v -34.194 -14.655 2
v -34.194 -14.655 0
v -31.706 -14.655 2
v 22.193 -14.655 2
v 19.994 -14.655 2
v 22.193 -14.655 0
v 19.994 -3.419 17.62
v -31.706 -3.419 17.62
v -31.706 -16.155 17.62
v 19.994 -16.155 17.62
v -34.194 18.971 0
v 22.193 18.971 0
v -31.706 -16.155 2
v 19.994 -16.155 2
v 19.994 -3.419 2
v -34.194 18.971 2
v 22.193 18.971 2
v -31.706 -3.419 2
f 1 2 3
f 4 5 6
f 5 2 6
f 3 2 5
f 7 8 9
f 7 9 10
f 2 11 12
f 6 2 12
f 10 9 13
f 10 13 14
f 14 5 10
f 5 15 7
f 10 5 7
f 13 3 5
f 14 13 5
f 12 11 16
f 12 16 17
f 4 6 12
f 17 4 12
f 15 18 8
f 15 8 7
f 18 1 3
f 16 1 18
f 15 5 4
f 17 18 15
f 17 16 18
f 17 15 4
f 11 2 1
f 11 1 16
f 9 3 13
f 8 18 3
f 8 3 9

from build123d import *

# Parameters (mm, degrees)
F0_W     = 56.3871189952
F0_H     = 33.6253512651
F1_DEPTH = 2
F2_W     = 51.7
F2_H     = 11.2356165416
F3_DEPTH = 15.62
F4_W     = 51.7
F4_H     = 15.62
F5_DEPTH = 1.5


# Not quite as in the source:
# - a feature of the source that left no trace in its solid (it failed there, or was rolled back) is left out


with BuildPart() as f1:
    # F0 (on Top) → F1 (new body)
    with BuildSketch(Plane.XY):
        with Locations((-6.0005225241, 2.1580690518)):
            Rectangle(F0_W, F0_H)
    extrude(amount=F1_DEPTH)

    # F2 (on face) → F3 (join)
    with BuildSketch(Plane.XY.offset(2)):
        with Locations((-5.8556830972, -9.0367983099)):
            Rectangle(F2_W, F2_H)
    extrude(amount=F3_DEPTH)

    # F4 (on face) → F5 (join)
    with BuildSketch(Plane.XZ.offset(14.6546065807)):
        with Locations((-5.8556830972, 9.81)):
            Rectangle(F4_W, F4_H)
    extrude(amount=F5_DEPTH)


solid = f1.part
